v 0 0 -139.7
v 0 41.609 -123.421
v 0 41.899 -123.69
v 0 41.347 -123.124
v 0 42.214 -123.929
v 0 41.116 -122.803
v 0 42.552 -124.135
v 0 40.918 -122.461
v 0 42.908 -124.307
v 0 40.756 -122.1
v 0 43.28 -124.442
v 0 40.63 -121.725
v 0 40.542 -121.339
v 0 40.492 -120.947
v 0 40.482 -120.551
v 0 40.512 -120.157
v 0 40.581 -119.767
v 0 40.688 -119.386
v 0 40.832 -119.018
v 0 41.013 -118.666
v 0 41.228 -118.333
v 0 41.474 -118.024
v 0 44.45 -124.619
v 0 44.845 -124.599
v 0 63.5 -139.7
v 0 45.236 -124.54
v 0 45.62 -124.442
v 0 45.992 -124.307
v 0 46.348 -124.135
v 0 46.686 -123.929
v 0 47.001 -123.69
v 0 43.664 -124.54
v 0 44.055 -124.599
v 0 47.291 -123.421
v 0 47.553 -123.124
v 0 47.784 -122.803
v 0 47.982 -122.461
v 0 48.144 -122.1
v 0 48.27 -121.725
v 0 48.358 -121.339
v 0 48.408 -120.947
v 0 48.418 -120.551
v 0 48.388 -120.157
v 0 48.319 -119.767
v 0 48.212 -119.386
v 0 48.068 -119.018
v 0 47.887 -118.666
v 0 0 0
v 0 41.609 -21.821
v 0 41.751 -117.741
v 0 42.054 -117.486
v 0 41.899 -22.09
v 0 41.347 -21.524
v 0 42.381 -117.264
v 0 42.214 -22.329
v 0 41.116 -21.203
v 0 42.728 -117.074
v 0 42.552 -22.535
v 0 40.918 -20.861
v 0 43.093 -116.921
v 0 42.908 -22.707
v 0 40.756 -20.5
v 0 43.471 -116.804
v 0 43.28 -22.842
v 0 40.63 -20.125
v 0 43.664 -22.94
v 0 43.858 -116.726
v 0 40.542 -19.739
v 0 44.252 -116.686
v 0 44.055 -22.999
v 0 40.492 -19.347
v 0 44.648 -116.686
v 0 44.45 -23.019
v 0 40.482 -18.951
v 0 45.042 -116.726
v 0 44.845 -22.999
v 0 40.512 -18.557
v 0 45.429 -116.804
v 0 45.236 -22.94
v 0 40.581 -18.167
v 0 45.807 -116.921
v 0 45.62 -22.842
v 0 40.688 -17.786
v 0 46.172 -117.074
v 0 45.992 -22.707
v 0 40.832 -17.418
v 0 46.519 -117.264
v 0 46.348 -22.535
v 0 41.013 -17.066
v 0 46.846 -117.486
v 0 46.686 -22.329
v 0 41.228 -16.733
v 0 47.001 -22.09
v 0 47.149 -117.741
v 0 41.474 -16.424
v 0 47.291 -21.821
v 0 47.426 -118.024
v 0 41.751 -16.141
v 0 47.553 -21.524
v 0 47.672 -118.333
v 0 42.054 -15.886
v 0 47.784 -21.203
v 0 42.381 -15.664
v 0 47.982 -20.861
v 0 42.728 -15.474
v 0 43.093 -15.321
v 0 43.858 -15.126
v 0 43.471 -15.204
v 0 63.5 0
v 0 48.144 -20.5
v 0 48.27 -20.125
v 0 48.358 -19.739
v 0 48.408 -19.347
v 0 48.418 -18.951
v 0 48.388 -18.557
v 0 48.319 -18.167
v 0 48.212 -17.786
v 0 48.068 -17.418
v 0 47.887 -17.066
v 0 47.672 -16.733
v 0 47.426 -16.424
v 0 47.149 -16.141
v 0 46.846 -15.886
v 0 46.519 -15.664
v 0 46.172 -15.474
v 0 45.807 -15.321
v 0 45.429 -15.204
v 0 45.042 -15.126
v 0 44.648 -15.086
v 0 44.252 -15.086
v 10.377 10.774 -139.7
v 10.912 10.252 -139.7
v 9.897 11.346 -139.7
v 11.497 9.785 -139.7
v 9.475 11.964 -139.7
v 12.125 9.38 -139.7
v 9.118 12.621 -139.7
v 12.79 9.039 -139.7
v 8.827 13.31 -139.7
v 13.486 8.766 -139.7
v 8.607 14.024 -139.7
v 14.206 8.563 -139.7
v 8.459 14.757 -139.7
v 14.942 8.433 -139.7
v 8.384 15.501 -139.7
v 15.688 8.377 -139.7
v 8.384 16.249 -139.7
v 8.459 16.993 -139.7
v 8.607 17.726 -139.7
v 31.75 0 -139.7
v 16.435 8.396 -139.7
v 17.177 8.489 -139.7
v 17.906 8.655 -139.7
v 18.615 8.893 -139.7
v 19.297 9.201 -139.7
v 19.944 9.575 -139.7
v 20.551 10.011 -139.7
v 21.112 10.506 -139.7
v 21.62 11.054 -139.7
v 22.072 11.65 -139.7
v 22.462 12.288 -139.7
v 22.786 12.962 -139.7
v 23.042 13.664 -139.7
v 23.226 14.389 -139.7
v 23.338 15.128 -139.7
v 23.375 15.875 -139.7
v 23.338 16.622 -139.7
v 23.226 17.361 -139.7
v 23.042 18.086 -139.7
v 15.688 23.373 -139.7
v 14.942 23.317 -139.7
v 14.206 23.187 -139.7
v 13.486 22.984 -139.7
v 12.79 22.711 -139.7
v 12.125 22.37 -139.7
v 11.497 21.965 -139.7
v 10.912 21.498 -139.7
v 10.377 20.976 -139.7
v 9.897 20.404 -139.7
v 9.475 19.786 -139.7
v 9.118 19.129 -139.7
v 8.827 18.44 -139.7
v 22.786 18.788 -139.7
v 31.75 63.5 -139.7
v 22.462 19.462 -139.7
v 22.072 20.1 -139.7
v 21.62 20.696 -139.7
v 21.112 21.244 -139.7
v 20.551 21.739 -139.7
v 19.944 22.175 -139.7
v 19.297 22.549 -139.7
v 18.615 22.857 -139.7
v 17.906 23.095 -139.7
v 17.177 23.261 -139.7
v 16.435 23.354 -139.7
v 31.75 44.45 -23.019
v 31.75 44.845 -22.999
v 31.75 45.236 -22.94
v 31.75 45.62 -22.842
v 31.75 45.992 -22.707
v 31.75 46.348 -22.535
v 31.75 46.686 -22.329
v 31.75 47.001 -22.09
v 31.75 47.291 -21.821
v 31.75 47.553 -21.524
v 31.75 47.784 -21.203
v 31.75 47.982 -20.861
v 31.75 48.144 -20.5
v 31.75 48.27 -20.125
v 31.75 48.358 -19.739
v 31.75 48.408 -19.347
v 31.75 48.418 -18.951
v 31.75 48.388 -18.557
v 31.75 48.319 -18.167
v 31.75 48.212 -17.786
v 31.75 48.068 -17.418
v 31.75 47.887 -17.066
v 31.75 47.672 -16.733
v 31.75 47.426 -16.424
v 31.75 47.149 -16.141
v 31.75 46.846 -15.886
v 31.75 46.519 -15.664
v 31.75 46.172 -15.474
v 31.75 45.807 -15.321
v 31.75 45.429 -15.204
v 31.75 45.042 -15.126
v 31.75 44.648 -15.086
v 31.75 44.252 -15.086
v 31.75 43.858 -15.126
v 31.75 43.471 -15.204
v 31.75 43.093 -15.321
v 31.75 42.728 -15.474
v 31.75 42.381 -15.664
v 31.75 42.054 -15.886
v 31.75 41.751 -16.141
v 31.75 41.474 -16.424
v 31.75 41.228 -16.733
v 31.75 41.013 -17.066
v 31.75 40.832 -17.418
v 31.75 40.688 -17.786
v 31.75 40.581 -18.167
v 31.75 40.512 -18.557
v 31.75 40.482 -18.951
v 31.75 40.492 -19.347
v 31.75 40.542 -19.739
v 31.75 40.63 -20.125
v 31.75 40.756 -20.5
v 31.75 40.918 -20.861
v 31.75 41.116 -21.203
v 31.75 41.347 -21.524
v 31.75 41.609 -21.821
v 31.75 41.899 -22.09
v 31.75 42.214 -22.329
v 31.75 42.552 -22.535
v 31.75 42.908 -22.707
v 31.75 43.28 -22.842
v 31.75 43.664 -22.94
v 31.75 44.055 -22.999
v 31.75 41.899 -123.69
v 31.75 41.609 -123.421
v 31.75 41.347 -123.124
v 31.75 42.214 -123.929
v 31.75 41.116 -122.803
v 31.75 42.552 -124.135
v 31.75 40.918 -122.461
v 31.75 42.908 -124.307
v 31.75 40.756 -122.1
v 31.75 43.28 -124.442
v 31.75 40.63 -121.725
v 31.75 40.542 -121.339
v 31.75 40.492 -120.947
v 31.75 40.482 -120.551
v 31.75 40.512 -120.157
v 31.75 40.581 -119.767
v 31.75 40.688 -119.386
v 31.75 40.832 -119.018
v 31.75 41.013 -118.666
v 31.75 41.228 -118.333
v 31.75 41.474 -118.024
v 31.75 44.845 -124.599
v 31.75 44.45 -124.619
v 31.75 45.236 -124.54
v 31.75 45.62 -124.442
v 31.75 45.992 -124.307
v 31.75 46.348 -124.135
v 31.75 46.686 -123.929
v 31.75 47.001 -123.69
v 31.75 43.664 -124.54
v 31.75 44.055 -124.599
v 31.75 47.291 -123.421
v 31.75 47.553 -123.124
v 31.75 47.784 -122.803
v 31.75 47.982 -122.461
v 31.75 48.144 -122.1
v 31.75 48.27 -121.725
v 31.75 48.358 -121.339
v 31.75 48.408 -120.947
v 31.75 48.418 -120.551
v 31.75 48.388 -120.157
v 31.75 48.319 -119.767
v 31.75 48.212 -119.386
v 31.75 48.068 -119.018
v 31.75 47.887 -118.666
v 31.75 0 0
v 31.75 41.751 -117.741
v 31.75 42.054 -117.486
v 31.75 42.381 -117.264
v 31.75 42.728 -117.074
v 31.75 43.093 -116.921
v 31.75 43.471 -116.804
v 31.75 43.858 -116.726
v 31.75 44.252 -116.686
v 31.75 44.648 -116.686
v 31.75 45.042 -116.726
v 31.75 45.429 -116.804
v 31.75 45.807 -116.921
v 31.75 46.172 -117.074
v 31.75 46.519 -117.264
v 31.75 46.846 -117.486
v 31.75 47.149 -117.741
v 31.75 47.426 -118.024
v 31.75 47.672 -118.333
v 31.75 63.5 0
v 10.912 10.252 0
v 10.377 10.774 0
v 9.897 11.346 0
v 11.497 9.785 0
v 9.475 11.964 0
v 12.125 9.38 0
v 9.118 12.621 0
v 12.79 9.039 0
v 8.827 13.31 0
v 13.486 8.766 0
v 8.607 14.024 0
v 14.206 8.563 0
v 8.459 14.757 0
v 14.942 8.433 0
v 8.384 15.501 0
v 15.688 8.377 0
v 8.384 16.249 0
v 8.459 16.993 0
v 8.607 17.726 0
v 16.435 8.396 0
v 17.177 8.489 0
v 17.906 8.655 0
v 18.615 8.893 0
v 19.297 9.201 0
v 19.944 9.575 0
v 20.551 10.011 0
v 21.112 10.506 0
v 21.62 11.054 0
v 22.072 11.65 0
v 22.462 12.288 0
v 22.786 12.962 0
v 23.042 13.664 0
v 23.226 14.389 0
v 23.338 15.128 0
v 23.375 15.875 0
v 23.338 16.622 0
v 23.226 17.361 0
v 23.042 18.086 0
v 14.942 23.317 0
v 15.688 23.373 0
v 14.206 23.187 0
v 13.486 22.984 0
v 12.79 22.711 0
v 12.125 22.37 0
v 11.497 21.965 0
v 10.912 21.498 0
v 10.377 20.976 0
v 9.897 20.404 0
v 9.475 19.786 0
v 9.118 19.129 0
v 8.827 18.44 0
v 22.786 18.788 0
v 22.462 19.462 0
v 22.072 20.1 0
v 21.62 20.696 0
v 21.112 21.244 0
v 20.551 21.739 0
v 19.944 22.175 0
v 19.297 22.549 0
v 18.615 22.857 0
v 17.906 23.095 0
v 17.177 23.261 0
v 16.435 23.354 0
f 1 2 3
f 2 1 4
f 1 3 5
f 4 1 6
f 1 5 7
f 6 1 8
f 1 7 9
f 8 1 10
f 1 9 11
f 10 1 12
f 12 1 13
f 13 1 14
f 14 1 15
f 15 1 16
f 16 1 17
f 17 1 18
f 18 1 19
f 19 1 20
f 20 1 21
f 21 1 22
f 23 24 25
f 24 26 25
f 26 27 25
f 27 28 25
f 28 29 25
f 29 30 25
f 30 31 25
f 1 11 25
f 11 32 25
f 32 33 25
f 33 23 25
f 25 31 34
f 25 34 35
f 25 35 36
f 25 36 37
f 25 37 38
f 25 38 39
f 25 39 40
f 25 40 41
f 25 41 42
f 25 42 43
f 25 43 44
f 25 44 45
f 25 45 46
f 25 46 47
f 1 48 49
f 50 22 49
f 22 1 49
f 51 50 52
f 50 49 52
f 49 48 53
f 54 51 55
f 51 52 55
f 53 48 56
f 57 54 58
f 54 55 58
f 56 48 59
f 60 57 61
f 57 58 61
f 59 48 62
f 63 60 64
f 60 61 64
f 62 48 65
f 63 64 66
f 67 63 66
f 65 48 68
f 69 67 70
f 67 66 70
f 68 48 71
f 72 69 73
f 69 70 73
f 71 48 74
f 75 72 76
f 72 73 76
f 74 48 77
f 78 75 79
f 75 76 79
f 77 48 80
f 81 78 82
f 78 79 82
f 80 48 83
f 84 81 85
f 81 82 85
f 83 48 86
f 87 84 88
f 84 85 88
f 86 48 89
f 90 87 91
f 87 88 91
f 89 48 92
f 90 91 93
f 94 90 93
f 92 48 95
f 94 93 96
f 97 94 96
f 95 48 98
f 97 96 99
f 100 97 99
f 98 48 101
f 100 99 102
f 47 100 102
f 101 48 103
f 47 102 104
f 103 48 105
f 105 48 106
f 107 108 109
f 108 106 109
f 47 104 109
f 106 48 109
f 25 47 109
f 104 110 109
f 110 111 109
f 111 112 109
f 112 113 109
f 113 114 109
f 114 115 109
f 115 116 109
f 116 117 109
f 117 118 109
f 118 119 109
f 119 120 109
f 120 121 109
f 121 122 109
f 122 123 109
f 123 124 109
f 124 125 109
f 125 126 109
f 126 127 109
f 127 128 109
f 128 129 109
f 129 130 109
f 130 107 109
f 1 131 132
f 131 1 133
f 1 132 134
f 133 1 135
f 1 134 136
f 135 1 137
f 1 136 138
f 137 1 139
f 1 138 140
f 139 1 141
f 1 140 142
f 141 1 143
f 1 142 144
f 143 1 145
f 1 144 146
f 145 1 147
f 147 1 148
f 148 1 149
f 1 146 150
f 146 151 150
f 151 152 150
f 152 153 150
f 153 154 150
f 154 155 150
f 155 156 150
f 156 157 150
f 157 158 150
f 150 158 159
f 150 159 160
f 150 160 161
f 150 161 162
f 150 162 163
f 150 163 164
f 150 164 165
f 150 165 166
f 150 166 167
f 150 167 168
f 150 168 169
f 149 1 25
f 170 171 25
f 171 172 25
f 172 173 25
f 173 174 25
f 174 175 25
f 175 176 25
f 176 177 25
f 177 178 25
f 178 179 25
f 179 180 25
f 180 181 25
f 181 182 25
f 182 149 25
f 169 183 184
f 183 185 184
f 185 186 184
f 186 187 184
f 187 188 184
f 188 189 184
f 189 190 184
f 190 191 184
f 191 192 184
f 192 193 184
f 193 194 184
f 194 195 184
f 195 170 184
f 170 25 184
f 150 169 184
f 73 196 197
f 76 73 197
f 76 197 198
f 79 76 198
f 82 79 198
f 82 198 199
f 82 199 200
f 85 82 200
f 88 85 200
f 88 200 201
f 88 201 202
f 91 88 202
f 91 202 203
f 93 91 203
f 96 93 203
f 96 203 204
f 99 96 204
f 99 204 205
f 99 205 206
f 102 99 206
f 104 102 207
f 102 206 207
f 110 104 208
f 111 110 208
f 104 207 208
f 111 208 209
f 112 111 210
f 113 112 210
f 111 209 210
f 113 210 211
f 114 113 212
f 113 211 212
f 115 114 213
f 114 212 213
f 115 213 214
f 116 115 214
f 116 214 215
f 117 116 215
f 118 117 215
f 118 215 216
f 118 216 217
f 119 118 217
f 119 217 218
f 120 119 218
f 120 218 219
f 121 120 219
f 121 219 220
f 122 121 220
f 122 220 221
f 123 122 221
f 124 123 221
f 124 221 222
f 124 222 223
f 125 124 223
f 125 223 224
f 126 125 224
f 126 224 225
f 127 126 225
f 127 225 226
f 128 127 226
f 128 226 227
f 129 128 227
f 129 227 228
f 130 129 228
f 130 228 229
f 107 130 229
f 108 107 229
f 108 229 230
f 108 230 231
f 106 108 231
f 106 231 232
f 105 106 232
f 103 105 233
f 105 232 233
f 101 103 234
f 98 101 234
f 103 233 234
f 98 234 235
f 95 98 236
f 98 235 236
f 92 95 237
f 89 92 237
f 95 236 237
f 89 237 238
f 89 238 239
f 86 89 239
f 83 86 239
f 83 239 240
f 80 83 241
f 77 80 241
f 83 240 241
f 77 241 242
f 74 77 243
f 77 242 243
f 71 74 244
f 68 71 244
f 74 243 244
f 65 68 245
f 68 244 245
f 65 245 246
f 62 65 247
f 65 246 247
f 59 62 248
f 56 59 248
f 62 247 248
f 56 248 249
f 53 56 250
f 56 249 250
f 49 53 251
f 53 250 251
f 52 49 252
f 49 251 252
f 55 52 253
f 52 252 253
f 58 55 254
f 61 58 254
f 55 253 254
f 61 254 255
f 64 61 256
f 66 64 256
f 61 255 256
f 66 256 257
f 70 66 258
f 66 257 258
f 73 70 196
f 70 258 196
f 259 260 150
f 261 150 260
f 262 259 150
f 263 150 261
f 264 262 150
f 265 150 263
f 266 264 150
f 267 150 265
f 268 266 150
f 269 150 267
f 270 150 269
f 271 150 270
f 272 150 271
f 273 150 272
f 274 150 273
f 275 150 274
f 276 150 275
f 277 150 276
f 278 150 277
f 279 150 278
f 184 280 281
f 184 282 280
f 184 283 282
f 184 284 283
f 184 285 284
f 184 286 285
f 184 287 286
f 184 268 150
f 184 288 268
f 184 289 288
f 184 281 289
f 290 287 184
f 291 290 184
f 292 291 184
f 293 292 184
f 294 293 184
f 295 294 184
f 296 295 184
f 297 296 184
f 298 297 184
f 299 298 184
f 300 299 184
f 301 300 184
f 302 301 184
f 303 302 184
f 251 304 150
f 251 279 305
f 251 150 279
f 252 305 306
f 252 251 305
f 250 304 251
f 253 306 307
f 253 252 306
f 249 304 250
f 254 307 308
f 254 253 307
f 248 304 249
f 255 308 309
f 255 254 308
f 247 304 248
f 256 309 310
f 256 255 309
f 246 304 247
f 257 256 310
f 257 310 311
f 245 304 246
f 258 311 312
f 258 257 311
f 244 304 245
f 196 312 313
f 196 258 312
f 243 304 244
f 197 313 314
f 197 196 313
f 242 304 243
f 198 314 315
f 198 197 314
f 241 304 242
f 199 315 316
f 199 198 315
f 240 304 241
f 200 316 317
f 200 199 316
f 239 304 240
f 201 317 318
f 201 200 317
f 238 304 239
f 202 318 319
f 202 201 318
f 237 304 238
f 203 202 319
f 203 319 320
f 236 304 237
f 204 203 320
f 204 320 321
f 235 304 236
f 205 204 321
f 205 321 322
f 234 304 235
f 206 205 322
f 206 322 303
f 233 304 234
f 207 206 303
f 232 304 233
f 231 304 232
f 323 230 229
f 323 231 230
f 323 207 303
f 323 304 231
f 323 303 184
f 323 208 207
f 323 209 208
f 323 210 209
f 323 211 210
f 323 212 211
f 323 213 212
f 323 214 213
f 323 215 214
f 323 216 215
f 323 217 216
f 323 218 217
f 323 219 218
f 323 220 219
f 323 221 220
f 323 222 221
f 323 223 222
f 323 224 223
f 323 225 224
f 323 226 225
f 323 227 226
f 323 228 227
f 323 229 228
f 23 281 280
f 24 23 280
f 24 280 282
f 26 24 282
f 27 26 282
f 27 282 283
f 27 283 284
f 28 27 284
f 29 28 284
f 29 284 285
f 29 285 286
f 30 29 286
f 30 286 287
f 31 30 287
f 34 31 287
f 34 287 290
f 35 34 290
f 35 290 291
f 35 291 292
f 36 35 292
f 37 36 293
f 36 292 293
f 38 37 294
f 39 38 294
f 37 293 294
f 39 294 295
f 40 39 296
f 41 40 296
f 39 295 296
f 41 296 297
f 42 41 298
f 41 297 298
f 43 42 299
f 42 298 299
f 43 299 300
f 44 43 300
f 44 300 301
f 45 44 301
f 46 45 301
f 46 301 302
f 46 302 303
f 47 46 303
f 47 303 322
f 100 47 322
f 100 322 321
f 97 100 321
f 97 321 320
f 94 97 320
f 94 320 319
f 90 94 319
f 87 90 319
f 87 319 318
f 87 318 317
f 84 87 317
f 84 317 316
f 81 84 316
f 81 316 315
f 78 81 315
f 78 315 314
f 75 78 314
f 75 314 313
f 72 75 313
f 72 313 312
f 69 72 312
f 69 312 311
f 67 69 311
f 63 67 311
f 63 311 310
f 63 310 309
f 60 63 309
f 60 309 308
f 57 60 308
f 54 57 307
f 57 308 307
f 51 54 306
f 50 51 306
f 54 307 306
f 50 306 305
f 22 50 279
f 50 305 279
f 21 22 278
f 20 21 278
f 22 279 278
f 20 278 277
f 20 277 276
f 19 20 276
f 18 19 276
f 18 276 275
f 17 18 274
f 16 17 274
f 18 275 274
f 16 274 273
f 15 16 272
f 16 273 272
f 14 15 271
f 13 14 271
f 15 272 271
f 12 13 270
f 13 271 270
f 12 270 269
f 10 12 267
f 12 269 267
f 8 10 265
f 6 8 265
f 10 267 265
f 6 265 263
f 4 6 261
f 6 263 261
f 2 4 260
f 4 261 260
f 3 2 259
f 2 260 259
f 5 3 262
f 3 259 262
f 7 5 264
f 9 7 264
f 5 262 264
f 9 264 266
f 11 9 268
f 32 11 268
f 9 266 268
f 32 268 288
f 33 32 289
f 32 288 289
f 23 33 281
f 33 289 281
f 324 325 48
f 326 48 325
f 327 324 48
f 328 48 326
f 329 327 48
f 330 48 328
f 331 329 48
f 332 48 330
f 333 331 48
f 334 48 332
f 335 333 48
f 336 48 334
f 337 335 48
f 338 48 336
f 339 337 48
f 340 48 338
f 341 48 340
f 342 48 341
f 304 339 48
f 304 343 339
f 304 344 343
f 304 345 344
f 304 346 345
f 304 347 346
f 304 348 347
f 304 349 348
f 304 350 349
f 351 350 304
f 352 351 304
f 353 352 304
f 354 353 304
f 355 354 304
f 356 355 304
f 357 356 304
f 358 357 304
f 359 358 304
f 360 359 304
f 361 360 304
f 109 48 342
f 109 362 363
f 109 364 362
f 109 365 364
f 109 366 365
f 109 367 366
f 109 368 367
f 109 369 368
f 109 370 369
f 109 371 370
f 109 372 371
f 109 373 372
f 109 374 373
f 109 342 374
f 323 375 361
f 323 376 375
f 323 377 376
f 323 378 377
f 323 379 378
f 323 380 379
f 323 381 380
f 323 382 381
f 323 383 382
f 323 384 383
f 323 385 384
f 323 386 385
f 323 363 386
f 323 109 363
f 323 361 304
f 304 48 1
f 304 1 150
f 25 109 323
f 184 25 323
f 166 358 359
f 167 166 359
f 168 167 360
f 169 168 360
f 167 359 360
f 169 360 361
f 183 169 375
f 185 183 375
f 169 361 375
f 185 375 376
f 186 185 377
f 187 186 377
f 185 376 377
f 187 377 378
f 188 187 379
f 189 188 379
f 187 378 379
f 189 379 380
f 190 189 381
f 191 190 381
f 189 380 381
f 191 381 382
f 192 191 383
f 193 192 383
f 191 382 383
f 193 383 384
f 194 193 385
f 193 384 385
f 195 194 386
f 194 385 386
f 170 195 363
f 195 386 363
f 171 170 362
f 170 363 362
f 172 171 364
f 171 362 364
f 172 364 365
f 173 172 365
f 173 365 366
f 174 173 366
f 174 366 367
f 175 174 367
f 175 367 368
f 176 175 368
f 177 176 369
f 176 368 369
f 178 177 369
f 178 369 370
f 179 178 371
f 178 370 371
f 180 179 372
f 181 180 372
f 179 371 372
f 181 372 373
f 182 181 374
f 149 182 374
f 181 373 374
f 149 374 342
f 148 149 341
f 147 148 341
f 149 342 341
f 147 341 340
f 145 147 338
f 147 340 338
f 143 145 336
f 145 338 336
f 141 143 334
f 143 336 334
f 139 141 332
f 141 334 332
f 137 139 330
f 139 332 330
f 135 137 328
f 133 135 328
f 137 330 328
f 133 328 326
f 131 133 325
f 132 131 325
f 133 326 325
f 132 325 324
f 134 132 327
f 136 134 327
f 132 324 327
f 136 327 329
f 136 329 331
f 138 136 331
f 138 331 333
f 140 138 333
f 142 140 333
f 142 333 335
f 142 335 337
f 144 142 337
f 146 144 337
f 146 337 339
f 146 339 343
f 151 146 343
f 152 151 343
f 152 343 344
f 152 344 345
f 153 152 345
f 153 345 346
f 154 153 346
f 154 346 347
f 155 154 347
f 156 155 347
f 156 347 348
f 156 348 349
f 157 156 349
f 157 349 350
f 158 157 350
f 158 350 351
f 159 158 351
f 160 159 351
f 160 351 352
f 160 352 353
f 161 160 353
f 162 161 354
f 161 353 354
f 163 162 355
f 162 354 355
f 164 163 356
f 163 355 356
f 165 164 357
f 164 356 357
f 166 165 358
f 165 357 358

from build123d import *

# Parameters (mm, degrees)
SKETCH1_W           = 31.75
SKETCH1_H           = 63.5
SKETCH1_R           = 7.5
BOSS_EXTRUDE1_DEPTH = 139.7
SKETCH2_R           = 3.96875
CUT_EXTRUDE1_DEPTH  = 139.7


with BuildPart() as part:
    # Sketch1 → Boss-Extrude1 (new body)
    with BuildSketch(Plane.XY):
        with Locations((15.875, 31.75)):
            Rectangle(SKETCH1_W, SKETCH1_H)
        with Locations((15.875, 15.875)):
            Circle(SKETCH1_R, mode=Mode.SUBTRACT)
    extrude(amount=-BOSS_EXTRUDE1_DEPTH)

    # Sketch2 → Cut-Extrude1 (cut)
    with BuildSketch(Plane(origin=(31.75, 0, 0), x_dir=(0, 0, -1), z_dir=(1, 0, 0))):
        with Locations((19.05, 44.45)):
            Circle(SKETCH2_R)
        with Locations((120.65, 44.45)):
            Circle(SKETCH2_R)
    extrude(amount=-CUT_EXTRUDE1_DEPTH, mode=Mode.SUBTRACT)


solid = part.part
